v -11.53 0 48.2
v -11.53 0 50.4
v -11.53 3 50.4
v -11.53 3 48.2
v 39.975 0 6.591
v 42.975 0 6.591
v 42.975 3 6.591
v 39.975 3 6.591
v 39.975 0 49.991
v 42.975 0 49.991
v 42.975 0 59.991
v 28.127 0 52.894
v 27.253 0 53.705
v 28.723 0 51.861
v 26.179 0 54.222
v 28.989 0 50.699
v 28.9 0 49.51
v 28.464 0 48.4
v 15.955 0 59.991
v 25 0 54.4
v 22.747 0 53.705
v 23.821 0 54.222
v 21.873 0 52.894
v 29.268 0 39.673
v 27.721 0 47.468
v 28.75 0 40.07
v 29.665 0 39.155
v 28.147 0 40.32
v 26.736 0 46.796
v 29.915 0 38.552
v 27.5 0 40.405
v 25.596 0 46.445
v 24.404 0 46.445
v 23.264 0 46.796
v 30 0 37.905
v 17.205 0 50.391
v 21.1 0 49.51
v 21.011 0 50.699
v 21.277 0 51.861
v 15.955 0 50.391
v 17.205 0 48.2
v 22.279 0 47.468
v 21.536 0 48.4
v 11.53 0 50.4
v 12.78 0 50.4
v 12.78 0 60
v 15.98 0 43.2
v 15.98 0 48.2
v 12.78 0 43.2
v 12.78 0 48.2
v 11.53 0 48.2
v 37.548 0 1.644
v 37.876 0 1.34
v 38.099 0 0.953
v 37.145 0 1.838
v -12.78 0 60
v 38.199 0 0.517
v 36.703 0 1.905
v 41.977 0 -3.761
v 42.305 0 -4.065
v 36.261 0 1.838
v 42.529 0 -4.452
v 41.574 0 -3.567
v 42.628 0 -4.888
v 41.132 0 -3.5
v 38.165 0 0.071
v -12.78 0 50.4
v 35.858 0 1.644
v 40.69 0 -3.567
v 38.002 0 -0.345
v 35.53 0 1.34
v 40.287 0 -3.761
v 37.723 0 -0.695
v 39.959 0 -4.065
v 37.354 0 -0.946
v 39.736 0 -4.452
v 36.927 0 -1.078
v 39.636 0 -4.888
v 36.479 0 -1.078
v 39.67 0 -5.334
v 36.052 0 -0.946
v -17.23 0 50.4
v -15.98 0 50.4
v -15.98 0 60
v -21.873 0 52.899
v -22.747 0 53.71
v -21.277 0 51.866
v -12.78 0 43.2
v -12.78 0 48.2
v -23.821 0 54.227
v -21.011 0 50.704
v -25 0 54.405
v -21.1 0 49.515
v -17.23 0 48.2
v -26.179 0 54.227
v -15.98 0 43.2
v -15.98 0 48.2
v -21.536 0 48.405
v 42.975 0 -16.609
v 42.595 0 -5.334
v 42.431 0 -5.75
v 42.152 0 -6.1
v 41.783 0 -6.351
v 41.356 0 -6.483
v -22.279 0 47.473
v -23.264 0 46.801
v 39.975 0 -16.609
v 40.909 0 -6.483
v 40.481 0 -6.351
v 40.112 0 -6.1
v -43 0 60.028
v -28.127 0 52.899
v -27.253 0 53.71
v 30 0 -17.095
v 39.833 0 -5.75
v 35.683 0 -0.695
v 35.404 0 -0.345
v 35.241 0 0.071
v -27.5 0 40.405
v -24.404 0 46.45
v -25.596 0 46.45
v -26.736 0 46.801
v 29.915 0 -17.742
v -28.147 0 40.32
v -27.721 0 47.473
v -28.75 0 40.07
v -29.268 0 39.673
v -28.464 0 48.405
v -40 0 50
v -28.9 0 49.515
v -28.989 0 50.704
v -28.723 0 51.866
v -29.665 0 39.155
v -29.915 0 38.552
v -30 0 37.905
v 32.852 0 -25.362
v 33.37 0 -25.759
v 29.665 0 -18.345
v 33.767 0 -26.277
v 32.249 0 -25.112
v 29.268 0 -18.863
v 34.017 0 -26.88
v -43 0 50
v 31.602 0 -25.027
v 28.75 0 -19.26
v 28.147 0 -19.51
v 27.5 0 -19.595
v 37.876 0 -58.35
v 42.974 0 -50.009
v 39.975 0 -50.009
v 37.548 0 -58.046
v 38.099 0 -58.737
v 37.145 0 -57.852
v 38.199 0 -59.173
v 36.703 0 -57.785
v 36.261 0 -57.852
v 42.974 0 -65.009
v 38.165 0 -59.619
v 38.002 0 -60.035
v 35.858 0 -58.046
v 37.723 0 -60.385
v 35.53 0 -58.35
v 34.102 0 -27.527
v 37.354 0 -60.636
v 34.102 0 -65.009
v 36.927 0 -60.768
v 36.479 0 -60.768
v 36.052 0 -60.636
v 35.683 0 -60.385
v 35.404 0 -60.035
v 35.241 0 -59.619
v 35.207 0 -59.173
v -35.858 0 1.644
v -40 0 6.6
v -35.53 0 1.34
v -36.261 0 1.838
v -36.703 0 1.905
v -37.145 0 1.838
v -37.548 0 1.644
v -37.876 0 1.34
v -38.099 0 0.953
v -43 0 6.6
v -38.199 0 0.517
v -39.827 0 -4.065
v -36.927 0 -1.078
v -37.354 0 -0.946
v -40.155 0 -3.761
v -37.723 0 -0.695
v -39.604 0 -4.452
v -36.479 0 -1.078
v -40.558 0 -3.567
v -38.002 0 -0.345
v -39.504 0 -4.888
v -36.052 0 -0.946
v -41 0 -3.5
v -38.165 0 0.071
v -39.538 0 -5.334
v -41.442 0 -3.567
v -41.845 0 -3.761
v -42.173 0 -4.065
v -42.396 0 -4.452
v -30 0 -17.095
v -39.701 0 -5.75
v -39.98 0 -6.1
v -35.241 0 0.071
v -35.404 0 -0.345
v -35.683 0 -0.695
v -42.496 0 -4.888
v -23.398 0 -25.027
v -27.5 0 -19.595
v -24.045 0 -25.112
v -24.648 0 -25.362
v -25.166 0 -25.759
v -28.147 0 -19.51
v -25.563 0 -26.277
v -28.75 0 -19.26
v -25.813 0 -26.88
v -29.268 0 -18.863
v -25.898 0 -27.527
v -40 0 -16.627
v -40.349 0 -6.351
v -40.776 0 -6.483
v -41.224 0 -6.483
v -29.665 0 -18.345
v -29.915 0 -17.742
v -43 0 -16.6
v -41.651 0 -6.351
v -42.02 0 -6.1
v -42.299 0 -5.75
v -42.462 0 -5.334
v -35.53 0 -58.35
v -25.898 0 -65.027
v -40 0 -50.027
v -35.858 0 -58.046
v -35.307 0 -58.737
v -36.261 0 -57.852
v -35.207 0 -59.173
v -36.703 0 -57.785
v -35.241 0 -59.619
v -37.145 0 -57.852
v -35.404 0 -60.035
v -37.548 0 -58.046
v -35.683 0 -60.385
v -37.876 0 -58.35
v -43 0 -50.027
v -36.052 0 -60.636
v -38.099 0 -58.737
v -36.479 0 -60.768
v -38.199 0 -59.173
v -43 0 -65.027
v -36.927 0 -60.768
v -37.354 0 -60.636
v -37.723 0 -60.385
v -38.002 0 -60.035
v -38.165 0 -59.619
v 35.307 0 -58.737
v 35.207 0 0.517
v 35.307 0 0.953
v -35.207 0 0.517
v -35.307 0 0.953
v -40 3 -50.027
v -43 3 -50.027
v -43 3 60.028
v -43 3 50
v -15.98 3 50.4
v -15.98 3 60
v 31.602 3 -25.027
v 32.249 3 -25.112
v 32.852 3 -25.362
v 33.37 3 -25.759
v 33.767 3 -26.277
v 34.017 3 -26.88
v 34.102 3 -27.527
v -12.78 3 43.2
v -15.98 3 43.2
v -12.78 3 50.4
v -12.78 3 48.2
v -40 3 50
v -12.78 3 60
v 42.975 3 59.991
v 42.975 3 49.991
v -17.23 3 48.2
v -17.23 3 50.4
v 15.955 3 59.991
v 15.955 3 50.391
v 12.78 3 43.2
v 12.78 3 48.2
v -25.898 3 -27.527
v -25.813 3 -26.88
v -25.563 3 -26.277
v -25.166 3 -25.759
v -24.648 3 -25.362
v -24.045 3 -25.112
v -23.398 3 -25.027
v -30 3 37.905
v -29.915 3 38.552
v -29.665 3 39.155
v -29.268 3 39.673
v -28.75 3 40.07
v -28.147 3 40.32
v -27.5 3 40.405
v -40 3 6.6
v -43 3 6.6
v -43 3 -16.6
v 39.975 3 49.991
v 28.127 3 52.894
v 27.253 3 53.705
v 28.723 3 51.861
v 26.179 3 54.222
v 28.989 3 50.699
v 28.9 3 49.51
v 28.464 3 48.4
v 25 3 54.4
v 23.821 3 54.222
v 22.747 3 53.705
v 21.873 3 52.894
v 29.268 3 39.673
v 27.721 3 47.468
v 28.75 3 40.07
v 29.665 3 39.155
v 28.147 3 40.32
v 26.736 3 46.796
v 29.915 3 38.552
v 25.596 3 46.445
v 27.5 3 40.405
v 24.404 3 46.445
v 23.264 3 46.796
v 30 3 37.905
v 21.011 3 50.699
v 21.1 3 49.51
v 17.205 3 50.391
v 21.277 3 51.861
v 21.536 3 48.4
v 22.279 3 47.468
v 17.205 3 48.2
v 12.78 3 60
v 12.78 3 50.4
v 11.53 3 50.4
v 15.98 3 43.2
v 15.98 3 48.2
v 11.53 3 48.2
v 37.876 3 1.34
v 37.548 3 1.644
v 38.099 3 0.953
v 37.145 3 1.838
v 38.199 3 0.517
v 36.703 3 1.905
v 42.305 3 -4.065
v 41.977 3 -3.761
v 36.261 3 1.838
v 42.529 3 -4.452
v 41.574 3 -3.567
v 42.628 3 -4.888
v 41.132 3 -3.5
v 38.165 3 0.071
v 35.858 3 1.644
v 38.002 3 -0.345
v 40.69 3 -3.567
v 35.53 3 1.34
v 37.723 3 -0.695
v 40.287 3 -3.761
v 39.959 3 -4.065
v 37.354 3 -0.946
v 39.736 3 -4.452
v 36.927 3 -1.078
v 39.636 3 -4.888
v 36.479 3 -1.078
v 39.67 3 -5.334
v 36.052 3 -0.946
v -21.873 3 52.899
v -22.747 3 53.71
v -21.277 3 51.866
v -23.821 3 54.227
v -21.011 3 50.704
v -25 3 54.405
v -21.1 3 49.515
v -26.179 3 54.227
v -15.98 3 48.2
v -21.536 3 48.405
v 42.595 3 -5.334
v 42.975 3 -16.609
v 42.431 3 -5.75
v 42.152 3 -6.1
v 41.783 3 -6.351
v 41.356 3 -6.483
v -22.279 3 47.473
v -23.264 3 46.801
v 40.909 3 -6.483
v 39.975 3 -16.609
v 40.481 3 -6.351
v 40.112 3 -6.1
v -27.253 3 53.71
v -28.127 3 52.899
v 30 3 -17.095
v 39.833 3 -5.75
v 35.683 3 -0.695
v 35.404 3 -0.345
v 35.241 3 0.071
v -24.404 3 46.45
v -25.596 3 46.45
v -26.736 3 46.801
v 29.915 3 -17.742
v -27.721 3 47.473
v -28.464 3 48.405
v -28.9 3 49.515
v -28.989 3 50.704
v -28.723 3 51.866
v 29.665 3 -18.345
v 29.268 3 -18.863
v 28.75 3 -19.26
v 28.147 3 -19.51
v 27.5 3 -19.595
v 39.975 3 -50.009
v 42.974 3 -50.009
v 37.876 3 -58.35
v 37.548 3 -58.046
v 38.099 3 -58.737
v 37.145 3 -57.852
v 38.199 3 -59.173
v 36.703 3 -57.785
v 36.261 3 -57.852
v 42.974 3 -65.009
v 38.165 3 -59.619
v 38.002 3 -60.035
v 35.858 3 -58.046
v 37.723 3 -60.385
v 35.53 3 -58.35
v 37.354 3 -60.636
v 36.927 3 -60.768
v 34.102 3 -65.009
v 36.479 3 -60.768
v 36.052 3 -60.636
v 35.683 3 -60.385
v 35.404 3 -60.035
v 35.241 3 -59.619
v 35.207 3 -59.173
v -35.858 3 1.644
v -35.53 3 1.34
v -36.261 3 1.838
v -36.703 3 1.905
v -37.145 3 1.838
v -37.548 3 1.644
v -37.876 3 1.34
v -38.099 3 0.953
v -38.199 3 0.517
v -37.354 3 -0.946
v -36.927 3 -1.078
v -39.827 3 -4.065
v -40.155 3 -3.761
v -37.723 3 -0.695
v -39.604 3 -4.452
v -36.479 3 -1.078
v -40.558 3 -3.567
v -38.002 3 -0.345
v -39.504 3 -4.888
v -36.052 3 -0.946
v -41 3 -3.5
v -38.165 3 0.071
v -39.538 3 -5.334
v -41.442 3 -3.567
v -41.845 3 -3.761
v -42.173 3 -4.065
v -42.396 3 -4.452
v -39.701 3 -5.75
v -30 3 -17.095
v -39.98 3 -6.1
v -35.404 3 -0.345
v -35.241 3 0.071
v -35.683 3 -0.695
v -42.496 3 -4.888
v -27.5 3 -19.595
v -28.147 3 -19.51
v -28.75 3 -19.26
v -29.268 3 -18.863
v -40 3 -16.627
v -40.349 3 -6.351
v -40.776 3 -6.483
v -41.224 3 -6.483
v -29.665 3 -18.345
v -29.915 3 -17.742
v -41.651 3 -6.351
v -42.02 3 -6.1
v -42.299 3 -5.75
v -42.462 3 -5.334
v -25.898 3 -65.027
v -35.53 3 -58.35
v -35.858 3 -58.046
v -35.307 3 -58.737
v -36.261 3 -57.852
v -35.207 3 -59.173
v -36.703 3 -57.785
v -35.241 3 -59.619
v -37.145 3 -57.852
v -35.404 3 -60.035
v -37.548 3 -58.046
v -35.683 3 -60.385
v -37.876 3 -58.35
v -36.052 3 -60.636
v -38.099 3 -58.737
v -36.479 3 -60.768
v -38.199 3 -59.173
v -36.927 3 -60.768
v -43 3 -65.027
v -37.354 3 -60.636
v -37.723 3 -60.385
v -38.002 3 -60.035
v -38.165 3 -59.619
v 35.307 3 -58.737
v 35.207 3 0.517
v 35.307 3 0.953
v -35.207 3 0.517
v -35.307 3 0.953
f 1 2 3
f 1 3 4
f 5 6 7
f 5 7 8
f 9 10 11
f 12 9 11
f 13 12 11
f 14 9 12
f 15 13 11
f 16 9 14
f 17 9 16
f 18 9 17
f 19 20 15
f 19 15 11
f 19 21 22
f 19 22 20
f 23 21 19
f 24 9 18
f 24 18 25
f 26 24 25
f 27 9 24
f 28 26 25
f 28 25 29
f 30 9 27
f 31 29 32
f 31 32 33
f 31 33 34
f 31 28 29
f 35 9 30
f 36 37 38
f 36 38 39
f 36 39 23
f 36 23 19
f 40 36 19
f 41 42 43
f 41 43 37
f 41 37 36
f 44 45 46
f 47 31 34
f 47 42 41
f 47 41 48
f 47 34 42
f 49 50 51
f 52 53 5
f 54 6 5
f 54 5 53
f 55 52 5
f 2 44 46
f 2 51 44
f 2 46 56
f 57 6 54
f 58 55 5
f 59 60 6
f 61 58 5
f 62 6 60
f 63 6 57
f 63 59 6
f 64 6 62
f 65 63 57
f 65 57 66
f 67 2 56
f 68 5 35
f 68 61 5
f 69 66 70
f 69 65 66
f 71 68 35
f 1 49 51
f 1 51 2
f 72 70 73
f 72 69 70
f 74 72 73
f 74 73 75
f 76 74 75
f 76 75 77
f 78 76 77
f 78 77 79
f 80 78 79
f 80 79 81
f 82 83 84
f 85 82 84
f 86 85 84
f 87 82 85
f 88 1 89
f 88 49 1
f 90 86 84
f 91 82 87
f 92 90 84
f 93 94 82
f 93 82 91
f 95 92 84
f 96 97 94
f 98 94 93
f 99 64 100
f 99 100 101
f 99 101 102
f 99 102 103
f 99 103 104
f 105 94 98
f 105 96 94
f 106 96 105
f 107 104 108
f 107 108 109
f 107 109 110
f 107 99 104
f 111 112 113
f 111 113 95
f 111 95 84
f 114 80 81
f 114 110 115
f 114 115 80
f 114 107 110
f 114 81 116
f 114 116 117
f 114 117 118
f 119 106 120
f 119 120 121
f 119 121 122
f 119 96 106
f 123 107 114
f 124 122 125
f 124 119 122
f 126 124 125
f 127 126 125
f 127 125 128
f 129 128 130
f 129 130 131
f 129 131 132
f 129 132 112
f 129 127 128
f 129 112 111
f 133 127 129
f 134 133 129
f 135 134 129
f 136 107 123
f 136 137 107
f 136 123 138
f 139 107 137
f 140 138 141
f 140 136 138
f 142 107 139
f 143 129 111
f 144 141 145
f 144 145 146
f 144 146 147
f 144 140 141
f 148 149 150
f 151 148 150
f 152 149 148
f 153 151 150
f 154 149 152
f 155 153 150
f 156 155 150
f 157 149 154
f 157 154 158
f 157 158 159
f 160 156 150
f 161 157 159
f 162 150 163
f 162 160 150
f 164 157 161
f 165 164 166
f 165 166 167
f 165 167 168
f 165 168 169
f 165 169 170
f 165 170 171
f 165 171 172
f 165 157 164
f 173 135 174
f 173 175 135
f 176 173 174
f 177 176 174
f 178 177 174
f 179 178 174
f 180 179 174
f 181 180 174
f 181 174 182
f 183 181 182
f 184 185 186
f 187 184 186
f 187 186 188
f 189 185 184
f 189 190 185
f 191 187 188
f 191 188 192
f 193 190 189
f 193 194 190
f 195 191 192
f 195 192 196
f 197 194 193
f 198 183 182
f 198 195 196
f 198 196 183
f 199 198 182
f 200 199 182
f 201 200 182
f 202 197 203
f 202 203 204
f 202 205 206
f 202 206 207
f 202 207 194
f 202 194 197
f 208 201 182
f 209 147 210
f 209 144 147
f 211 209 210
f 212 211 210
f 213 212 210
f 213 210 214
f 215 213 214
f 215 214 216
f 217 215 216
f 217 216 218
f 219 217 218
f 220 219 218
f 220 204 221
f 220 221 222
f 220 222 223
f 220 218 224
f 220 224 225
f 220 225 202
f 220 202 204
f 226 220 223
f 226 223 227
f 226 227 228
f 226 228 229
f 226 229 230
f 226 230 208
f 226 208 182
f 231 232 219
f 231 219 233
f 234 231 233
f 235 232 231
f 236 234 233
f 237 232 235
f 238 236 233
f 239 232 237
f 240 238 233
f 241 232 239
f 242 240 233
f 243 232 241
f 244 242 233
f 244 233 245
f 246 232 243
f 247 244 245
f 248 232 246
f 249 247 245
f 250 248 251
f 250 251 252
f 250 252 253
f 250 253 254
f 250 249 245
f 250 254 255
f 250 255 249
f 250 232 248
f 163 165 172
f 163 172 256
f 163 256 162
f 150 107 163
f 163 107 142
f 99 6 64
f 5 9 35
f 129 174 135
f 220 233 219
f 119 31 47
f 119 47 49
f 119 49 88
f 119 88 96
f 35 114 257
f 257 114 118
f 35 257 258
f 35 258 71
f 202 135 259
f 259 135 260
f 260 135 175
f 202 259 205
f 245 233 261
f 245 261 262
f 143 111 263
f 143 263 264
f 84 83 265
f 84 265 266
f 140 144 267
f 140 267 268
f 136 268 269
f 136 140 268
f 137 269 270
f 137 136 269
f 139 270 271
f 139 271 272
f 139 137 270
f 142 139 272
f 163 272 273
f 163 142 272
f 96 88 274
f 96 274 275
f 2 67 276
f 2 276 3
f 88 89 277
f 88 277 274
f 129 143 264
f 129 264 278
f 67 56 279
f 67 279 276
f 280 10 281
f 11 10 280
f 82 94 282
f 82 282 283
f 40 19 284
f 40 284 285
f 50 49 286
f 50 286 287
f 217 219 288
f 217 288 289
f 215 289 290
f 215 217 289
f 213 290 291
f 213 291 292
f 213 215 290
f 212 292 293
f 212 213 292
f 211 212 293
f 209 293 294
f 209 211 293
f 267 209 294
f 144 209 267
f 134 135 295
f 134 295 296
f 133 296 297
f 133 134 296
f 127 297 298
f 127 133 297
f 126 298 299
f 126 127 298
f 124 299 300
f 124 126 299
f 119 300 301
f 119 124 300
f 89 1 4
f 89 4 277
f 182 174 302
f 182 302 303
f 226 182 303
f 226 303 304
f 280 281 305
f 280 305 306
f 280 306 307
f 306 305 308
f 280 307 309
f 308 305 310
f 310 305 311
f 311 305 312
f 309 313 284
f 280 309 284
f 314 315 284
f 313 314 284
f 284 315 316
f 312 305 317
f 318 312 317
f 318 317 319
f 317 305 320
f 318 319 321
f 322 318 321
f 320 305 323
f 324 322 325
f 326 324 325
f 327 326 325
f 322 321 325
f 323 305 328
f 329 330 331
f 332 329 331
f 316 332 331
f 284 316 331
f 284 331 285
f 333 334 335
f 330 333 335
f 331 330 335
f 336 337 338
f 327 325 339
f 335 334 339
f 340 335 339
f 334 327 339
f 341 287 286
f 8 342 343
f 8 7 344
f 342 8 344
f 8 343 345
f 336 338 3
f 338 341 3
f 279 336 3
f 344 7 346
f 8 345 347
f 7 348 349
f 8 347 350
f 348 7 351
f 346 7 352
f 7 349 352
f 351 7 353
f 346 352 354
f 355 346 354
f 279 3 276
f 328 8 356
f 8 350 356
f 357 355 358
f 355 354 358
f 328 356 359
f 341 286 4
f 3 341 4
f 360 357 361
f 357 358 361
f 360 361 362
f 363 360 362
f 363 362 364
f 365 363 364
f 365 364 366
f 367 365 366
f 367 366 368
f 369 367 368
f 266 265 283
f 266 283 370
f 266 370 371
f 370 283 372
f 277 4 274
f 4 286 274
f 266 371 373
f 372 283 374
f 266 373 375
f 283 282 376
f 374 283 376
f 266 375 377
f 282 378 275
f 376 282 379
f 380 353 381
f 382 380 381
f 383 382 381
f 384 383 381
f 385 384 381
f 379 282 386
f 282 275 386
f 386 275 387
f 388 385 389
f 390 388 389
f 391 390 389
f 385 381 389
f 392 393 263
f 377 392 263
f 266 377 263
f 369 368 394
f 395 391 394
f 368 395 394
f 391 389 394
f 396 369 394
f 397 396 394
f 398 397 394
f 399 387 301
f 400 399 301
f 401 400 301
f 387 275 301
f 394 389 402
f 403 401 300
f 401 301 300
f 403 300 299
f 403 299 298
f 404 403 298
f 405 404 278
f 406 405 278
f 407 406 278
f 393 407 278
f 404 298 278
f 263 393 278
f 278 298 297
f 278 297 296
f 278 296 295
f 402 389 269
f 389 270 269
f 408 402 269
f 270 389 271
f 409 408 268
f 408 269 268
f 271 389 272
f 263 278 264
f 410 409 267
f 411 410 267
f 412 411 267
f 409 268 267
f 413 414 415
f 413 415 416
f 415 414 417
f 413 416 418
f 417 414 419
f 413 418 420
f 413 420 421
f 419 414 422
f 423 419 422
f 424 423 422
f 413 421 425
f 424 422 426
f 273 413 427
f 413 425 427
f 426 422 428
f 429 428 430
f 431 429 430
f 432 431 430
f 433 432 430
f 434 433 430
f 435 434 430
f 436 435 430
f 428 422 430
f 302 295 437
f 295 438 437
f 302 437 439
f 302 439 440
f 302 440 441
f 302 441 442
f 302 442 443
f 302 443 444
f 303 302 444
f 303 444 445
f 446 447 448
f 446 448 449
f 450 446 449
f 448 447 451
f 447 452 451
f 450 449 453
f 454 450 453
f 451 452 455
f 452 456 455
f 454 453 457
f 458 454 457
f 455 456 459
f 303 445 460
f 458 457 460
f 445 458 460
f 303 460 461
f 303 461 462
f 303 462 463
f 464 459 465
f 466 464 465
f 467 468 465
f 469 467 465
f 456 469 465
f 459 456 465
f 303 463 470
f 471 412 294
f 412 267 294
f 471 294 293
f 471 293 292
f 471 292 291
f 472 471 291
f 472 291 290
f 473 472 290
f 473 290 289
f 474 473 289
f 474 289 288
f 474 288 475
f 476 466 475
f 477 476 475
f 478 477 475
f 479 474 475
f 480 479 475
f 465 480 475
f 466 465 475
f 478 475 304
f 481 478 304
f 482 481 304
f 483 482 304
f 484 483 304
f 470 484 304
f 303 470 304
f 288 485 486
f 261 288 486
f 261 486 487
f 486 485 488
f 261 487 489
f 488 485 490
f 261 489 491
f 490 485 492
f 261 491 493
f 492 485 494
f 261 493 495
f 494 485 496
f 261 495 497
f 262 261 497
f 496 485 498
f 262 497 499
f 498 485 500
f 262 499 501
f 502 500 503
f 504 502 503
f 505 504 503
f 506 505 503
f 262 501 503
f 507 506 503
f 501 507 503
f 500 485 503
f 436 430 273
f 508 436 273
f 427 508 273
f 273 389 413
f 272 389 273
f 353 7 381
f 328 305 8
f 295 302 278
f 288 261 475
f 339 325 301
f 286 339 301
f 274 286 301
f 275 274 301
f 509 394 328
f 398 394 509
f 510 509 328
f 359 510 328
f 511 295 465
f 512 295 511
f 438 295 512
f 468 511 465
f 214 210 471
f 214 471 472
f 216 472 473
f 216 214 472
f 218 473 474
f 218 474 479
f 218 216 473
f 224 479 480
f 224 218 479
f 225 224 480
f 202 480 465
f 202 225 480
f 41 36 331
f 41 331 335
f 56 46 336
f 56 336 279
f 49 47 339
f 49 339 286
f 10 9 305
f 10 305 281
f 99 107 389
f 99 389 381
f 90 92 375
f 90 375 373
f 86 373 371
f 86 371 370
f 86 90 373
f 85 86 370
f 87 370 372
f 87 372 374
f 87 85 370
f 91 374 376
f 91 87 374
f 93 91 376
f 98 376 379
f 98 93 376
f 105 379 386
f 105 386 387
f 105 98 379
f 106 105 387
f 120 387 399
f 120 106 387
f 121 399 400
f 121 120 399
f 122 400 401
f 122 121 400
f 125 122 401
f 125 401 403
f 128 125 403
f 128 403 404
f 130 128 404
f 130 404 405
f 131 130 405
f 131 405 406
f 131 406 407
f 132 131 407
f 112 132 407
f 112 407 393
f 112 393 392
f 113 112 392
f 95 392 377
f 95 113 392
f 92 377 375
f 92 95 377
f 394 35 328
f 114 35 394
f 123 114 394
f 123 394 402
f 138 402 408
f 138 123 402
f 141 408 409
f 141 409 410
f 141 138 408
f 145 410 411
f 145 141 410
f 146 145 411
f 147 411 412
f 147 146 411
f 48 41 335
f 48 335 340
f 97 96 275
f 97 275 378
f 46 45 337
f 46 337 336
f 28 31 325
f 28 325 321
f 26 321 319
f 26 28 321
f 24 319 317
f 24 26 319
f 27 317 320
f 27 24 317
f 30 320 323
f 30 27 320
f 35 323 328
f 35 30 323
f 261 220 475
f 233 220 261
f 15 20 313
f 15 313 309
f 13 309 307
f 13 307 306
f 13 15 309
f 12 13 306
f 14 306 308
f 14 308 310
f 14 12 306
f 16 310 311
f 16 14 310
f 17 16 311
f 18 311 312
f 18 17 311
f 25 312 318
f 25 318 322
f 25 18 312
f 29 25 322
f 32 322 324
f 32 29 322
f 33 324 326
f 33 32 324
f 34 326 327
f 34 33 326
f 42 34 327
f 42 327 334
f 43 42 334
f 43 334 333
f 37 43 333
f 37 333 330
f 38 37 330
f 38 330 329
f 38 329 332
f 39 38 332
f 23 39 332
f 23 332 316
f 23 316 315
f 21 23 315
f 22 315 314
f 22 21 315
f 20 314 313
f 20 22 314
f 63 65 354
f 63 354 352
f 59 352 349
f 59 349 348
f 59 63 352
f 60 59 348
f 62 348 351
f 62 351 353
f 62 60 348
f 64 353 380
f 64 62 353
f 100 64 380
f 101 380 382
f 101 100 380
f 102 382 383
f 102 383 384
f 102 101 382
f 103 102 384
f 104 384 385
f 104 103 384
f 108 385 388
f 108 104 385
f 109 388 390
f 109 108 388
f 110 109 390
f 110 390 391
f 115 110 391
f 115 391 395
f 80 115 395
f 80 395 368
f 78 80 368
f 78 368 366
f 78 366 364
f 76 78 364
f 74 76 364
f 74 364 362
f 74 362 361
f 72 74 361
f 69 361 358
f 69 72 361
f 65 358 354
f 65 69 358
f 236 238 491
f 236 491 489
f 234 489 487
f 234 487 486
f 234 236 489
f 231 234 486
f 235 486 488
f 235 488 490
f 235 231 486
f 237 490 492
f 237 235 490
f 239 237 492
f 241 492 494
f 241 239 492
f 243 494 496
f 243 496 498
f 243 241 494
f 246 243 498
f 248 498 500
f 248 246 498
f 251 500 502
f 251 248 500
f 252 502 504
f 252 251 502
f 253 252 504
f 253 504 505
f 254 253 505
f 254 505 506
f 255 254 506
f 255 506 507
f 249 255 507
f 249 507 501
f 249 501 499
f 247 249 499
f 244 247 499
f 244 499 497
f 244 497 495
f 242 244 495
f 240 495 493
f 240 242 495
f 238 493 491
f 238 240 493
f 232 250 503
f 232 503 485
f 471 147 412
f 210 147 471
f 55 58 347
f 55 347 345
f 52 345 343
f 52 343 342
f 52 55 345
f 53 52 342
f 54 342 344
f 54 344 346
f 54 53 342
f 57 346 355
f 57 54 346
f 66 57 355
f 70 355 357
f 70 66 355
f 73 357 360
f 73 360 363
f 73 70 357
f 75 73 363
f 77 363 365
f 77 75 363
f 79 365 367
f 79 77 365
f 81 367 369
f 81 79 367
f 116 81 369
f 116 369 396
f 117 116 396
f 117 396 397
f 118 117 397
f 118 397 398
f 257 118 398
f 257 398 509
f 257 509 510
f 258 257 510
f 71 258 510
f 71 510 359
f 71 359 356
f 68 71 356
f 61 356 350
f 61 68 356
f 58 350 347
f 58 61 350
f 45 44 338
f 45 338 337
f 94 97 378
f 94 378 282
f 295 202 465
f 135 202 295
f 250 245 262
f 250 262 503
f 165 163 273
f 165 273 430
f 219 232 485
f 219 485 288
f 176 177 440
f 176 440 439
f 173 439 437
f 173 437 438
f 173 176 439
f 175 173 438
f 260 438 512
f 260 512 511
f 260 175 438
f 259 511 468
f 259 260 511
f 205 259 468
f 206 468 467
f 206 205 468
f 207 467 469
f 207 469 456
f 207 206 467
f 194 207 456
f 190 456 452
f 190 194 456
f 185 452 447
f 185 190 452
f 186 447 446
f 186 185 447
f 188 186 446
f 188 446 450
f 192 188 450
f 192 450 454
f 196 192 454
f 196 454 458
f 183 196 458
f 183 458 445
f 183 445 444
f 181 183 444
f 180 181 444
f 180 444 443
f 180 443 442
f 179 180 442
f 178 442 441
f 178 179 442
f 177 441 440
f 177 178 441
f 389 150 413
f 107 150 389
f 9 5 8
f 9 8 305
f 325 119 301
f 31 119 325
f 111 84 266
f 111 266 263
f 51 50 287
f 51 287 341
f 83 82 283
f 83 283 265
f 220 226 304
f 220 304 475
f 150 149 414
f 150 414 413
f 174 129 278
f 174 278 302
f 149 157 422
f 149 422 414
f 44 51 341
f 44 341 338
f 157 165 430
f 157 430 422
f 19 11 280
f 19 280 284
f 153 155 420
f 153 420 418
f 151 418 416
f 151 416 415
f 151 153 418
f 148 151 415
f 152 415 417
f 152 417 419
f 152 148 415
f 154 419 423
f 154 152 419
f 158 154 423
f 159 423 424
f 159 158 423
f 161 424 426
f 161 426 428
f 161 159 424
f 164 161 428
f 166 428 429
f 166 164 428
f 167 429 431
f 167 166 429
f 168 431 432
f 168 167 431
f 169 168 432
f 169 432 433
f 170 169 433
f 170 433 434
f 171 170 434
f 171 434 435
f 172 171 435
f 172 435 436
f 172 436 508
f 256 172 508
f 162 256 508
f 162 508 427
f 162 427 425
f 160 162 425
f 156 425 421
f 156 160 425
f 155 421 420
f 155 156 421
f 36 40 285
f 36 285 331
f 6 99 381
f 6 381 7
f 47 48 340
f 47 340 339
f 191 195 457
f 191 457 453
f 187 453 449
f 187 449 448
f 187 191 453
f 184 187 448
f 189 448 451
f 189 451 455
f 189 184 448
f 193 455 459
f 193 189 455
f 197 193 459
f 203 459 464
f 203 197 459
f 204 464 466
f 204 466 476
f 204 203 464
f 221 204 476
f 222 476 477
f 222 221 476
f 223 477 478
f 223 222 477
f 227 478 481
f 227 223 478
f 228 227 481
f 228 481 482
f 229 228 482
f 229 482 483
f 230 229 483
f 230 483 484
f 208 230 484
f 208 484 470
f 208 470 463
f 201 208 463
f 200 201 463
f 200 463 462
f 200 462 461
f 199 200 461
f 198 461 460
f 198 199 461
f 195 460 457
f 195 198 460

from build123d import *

# Parameters (mm, degrees)
SKETCH1_R           = 1.5
SKETCH1_R_2         = 4
BOSS_EXTRUDE2_DEPTH = 3


with BuildPart() as part:
    # Sketch1 → Boss-Extrude2 (new body)
    with BuildSketch(Plane(origin=(0, 0, 0), x_dir=(1, 0, 0), z_dir=(0, 1, 0))):
        with BuildLine():
            Line((-43, 65.026712015), (-25.898177638, 65.026712015))
            Line((-25.898177638, 65.026712015), (-25.898177638, 27.526712015))
            ThreePointArc((-25.898177638, 27.526712015), (-25.165944591, 25.758945062), (-23.398177638, 25.026712015))
            Line((-23.398177638, 25.026712015), (31.601822362, 25.026712015))
            ThreePointArc((31.601822362, 25.026712015), (33.369636089, 25.758964437), (34.101888511, 27.526778164))
            Line((34.101888511, 27.526778164), (34.101888511, 65.008591724))
            Line((34.101888511, 65.008591724), (42.973532608, 65.008591724))
            Line((42.973532608, 65.008591724), (42.973532608, 50.008591724))
            Line((42.973532608, 50.008591724), (39.974710246, 50.008591724))
            Line((39.974710246, 50.008591724), (39.974710246, 16.608591724))
            Line((39.974710246, 16.608591724), (42.974710246, 16.608591724))
            Line((42.974710246, 16.608591724), (42.974710246, -6.591408276))
            Line((42.974710246, -6.591408276), (39.974710246, -6.591408276))
            Line((39.974710246, -6.591408276), (39.974710246, -49.991408276))
            Line((39.974710246, -49.991408276), (42.974710246, -49.991408276))
            Line((42.974710246, -49.991408276), (42.974710246, -59.991408276))
            Line((42.974710246, -59.991408276), (15.954710246, -59.991408276))
            Line((15.954710246, -59.991408276), (15.954710246, -50.391457529))
            Line((15.954710246, -50.391457529), (17.204695418, -50.391457529))
            Line((17.204695418, -50.391457529), (17.204695418, -48.200049254))
            Line((17.204695418, -48.200049254), (15.979985173, -48.200049254))
            Line((15.979985173, -48.200049254), (15.979985173, -43.200049254))
            Line((15.979985173, -43.200049254), (12.779985173, -43.200049254))
            Line((12.779985173, -43.200049254), (12.779985173, -48.200049254))
            Line((12.779985173, -48.200049254), (11.529985173, -48.200049254))
            Line((11.529985173, -48.200049254), (11.529985173, -50.400049254))
            Line((11.529985173, -50.400049254), (12.779985173, -50.400049254))
            Line((12.779985173, -50.400049254), (12.779985173, -60.000049254))
            Line((12.779985173, -60.000049254), (-12.780014827, -60.000049254))
            Line((-12.780014827, -60.000049254), (-12.780014827, -50.400049254))
            Line((-12.780014827, -50.400049254), (-11.530014827, -50.400049254))
            Line((-11.530014827, -50.400049254), (-11.530014827, -48.200049254))
            Line((-11.530014827, -48.200049254), (-12.780014827, -48.200049254))
            Line((-12.780014827, -48.200049254), (-12.780014827, -43.200049254))
            Line((-12.780014827, -43.200049254), (-15.980014827, -43.200049254))
            Line((-15.980014827, -43.200049254), (-15.980014827, -48.200049254))
            Line((-15.980014827, -48.200049254), (-17.230014827, -48.200049254))
            Line((-17.230014827, -48.200049254), (-17.230014827, -50.400049254))
            Line((-17.230014827, -50.400049254), (-15.980014827, -50.400049254))
            Line((-15.980014827, -50.400049254), (-15.980014827, -60.000049254))
            Line((-15.980014827, -60.000049254), (-43, -60.028356008))
            Line((-43, -60.028356008), (-43, -50))
            Line((-43, -50), (-40, -50))
            Line((-40, -50), (-40, -6.6))
            Line((-40, -6.6), (-43, -6.6))
            Line((-43, -6.6), (-43, 16.6))
            Line((-43, 16.6), (-40, 16.626712015))
            Line((-40, 16.626712015), (-40, 50.026712015))
            Line((-40, 50.026712015), (-43, 50.026712015))
            Line((-43, 50.026712015), (-43, 65.026712015))
        make_face()
        with Locations(Location((-41, 5, 0), (0, 0, 270))):
            Circle(SKETCH1_R, mode=Mode.SUBTRACT)
        with Locations(Location((-36.703, 59.285, 0), (0, 0, 270))):
            Circle(SKETCH1_R, mode=Mode.SUBTRACT)
        with Locations(Location((36.703, 59.285, 0), (0, 0, 270))):
            Circle(SKETCH1_R, mode=Mode.SUBTRACT)
        with Locations(Location((-36.703, -0.405, 0), (0, 0, 270))):
            Circle(SKETCH1_R, mode=Mode.SUBTRACT)
        with Locations(Location((36.703, -0.405, 0), (0, 0, 270))):
            Circle(SKETCH1_R, mode=Mode.SUBTRACT)
        with Locations(Location((-25, -50.405, 0), (0, 0, 270))):
            Circle(SKETCH1_R_2, mode=Mode.SUBTRACT)
        with Locations(Location((25, -50.400049254, 0), (0, 0, 270))):
            Circle(SKETCH1_R_2, mode=Mode.SUBTRACT)
        with Locations(Location((41.13223265, 5, 0), (0, 0, 270))):
            Circle(SKETCH1_R, mode=Mode.SUBTRACT)
        with BuildLine():
            Line((0, -40.405), (27.5, -40.405))
            ThreePointArc((27.5, -40.405), (29.267766953, -39.672766953), (30, -37.905))
            Line((30, -37.905), (30, 17.095))
            ThreePointArc((30, 17.095), (29.267766953, 18.862766953), (27.5, 19.595))
            Line((27.5, 19.595), (0, 19.595))
            Line((0, 19.595), (-27.5, 19.595))
            ThreePointArc((-27.5, 19.595), (-29.267766953, 18.862766953), (-30, 17.095))
            Line((-30, 17.095), (-30, -37.905))
            ThreePointArc((-30, -37.905), (-29.267766953, -39.672766953), (-27.5, -40.405))
            Line((-27.5, -40.405), (0, -40.405))
        make_face(mode=Mode.SUBTRACT)
    extrude(amount=BOSS_EXTRUDE2_DEPTH)


solid = part.part
